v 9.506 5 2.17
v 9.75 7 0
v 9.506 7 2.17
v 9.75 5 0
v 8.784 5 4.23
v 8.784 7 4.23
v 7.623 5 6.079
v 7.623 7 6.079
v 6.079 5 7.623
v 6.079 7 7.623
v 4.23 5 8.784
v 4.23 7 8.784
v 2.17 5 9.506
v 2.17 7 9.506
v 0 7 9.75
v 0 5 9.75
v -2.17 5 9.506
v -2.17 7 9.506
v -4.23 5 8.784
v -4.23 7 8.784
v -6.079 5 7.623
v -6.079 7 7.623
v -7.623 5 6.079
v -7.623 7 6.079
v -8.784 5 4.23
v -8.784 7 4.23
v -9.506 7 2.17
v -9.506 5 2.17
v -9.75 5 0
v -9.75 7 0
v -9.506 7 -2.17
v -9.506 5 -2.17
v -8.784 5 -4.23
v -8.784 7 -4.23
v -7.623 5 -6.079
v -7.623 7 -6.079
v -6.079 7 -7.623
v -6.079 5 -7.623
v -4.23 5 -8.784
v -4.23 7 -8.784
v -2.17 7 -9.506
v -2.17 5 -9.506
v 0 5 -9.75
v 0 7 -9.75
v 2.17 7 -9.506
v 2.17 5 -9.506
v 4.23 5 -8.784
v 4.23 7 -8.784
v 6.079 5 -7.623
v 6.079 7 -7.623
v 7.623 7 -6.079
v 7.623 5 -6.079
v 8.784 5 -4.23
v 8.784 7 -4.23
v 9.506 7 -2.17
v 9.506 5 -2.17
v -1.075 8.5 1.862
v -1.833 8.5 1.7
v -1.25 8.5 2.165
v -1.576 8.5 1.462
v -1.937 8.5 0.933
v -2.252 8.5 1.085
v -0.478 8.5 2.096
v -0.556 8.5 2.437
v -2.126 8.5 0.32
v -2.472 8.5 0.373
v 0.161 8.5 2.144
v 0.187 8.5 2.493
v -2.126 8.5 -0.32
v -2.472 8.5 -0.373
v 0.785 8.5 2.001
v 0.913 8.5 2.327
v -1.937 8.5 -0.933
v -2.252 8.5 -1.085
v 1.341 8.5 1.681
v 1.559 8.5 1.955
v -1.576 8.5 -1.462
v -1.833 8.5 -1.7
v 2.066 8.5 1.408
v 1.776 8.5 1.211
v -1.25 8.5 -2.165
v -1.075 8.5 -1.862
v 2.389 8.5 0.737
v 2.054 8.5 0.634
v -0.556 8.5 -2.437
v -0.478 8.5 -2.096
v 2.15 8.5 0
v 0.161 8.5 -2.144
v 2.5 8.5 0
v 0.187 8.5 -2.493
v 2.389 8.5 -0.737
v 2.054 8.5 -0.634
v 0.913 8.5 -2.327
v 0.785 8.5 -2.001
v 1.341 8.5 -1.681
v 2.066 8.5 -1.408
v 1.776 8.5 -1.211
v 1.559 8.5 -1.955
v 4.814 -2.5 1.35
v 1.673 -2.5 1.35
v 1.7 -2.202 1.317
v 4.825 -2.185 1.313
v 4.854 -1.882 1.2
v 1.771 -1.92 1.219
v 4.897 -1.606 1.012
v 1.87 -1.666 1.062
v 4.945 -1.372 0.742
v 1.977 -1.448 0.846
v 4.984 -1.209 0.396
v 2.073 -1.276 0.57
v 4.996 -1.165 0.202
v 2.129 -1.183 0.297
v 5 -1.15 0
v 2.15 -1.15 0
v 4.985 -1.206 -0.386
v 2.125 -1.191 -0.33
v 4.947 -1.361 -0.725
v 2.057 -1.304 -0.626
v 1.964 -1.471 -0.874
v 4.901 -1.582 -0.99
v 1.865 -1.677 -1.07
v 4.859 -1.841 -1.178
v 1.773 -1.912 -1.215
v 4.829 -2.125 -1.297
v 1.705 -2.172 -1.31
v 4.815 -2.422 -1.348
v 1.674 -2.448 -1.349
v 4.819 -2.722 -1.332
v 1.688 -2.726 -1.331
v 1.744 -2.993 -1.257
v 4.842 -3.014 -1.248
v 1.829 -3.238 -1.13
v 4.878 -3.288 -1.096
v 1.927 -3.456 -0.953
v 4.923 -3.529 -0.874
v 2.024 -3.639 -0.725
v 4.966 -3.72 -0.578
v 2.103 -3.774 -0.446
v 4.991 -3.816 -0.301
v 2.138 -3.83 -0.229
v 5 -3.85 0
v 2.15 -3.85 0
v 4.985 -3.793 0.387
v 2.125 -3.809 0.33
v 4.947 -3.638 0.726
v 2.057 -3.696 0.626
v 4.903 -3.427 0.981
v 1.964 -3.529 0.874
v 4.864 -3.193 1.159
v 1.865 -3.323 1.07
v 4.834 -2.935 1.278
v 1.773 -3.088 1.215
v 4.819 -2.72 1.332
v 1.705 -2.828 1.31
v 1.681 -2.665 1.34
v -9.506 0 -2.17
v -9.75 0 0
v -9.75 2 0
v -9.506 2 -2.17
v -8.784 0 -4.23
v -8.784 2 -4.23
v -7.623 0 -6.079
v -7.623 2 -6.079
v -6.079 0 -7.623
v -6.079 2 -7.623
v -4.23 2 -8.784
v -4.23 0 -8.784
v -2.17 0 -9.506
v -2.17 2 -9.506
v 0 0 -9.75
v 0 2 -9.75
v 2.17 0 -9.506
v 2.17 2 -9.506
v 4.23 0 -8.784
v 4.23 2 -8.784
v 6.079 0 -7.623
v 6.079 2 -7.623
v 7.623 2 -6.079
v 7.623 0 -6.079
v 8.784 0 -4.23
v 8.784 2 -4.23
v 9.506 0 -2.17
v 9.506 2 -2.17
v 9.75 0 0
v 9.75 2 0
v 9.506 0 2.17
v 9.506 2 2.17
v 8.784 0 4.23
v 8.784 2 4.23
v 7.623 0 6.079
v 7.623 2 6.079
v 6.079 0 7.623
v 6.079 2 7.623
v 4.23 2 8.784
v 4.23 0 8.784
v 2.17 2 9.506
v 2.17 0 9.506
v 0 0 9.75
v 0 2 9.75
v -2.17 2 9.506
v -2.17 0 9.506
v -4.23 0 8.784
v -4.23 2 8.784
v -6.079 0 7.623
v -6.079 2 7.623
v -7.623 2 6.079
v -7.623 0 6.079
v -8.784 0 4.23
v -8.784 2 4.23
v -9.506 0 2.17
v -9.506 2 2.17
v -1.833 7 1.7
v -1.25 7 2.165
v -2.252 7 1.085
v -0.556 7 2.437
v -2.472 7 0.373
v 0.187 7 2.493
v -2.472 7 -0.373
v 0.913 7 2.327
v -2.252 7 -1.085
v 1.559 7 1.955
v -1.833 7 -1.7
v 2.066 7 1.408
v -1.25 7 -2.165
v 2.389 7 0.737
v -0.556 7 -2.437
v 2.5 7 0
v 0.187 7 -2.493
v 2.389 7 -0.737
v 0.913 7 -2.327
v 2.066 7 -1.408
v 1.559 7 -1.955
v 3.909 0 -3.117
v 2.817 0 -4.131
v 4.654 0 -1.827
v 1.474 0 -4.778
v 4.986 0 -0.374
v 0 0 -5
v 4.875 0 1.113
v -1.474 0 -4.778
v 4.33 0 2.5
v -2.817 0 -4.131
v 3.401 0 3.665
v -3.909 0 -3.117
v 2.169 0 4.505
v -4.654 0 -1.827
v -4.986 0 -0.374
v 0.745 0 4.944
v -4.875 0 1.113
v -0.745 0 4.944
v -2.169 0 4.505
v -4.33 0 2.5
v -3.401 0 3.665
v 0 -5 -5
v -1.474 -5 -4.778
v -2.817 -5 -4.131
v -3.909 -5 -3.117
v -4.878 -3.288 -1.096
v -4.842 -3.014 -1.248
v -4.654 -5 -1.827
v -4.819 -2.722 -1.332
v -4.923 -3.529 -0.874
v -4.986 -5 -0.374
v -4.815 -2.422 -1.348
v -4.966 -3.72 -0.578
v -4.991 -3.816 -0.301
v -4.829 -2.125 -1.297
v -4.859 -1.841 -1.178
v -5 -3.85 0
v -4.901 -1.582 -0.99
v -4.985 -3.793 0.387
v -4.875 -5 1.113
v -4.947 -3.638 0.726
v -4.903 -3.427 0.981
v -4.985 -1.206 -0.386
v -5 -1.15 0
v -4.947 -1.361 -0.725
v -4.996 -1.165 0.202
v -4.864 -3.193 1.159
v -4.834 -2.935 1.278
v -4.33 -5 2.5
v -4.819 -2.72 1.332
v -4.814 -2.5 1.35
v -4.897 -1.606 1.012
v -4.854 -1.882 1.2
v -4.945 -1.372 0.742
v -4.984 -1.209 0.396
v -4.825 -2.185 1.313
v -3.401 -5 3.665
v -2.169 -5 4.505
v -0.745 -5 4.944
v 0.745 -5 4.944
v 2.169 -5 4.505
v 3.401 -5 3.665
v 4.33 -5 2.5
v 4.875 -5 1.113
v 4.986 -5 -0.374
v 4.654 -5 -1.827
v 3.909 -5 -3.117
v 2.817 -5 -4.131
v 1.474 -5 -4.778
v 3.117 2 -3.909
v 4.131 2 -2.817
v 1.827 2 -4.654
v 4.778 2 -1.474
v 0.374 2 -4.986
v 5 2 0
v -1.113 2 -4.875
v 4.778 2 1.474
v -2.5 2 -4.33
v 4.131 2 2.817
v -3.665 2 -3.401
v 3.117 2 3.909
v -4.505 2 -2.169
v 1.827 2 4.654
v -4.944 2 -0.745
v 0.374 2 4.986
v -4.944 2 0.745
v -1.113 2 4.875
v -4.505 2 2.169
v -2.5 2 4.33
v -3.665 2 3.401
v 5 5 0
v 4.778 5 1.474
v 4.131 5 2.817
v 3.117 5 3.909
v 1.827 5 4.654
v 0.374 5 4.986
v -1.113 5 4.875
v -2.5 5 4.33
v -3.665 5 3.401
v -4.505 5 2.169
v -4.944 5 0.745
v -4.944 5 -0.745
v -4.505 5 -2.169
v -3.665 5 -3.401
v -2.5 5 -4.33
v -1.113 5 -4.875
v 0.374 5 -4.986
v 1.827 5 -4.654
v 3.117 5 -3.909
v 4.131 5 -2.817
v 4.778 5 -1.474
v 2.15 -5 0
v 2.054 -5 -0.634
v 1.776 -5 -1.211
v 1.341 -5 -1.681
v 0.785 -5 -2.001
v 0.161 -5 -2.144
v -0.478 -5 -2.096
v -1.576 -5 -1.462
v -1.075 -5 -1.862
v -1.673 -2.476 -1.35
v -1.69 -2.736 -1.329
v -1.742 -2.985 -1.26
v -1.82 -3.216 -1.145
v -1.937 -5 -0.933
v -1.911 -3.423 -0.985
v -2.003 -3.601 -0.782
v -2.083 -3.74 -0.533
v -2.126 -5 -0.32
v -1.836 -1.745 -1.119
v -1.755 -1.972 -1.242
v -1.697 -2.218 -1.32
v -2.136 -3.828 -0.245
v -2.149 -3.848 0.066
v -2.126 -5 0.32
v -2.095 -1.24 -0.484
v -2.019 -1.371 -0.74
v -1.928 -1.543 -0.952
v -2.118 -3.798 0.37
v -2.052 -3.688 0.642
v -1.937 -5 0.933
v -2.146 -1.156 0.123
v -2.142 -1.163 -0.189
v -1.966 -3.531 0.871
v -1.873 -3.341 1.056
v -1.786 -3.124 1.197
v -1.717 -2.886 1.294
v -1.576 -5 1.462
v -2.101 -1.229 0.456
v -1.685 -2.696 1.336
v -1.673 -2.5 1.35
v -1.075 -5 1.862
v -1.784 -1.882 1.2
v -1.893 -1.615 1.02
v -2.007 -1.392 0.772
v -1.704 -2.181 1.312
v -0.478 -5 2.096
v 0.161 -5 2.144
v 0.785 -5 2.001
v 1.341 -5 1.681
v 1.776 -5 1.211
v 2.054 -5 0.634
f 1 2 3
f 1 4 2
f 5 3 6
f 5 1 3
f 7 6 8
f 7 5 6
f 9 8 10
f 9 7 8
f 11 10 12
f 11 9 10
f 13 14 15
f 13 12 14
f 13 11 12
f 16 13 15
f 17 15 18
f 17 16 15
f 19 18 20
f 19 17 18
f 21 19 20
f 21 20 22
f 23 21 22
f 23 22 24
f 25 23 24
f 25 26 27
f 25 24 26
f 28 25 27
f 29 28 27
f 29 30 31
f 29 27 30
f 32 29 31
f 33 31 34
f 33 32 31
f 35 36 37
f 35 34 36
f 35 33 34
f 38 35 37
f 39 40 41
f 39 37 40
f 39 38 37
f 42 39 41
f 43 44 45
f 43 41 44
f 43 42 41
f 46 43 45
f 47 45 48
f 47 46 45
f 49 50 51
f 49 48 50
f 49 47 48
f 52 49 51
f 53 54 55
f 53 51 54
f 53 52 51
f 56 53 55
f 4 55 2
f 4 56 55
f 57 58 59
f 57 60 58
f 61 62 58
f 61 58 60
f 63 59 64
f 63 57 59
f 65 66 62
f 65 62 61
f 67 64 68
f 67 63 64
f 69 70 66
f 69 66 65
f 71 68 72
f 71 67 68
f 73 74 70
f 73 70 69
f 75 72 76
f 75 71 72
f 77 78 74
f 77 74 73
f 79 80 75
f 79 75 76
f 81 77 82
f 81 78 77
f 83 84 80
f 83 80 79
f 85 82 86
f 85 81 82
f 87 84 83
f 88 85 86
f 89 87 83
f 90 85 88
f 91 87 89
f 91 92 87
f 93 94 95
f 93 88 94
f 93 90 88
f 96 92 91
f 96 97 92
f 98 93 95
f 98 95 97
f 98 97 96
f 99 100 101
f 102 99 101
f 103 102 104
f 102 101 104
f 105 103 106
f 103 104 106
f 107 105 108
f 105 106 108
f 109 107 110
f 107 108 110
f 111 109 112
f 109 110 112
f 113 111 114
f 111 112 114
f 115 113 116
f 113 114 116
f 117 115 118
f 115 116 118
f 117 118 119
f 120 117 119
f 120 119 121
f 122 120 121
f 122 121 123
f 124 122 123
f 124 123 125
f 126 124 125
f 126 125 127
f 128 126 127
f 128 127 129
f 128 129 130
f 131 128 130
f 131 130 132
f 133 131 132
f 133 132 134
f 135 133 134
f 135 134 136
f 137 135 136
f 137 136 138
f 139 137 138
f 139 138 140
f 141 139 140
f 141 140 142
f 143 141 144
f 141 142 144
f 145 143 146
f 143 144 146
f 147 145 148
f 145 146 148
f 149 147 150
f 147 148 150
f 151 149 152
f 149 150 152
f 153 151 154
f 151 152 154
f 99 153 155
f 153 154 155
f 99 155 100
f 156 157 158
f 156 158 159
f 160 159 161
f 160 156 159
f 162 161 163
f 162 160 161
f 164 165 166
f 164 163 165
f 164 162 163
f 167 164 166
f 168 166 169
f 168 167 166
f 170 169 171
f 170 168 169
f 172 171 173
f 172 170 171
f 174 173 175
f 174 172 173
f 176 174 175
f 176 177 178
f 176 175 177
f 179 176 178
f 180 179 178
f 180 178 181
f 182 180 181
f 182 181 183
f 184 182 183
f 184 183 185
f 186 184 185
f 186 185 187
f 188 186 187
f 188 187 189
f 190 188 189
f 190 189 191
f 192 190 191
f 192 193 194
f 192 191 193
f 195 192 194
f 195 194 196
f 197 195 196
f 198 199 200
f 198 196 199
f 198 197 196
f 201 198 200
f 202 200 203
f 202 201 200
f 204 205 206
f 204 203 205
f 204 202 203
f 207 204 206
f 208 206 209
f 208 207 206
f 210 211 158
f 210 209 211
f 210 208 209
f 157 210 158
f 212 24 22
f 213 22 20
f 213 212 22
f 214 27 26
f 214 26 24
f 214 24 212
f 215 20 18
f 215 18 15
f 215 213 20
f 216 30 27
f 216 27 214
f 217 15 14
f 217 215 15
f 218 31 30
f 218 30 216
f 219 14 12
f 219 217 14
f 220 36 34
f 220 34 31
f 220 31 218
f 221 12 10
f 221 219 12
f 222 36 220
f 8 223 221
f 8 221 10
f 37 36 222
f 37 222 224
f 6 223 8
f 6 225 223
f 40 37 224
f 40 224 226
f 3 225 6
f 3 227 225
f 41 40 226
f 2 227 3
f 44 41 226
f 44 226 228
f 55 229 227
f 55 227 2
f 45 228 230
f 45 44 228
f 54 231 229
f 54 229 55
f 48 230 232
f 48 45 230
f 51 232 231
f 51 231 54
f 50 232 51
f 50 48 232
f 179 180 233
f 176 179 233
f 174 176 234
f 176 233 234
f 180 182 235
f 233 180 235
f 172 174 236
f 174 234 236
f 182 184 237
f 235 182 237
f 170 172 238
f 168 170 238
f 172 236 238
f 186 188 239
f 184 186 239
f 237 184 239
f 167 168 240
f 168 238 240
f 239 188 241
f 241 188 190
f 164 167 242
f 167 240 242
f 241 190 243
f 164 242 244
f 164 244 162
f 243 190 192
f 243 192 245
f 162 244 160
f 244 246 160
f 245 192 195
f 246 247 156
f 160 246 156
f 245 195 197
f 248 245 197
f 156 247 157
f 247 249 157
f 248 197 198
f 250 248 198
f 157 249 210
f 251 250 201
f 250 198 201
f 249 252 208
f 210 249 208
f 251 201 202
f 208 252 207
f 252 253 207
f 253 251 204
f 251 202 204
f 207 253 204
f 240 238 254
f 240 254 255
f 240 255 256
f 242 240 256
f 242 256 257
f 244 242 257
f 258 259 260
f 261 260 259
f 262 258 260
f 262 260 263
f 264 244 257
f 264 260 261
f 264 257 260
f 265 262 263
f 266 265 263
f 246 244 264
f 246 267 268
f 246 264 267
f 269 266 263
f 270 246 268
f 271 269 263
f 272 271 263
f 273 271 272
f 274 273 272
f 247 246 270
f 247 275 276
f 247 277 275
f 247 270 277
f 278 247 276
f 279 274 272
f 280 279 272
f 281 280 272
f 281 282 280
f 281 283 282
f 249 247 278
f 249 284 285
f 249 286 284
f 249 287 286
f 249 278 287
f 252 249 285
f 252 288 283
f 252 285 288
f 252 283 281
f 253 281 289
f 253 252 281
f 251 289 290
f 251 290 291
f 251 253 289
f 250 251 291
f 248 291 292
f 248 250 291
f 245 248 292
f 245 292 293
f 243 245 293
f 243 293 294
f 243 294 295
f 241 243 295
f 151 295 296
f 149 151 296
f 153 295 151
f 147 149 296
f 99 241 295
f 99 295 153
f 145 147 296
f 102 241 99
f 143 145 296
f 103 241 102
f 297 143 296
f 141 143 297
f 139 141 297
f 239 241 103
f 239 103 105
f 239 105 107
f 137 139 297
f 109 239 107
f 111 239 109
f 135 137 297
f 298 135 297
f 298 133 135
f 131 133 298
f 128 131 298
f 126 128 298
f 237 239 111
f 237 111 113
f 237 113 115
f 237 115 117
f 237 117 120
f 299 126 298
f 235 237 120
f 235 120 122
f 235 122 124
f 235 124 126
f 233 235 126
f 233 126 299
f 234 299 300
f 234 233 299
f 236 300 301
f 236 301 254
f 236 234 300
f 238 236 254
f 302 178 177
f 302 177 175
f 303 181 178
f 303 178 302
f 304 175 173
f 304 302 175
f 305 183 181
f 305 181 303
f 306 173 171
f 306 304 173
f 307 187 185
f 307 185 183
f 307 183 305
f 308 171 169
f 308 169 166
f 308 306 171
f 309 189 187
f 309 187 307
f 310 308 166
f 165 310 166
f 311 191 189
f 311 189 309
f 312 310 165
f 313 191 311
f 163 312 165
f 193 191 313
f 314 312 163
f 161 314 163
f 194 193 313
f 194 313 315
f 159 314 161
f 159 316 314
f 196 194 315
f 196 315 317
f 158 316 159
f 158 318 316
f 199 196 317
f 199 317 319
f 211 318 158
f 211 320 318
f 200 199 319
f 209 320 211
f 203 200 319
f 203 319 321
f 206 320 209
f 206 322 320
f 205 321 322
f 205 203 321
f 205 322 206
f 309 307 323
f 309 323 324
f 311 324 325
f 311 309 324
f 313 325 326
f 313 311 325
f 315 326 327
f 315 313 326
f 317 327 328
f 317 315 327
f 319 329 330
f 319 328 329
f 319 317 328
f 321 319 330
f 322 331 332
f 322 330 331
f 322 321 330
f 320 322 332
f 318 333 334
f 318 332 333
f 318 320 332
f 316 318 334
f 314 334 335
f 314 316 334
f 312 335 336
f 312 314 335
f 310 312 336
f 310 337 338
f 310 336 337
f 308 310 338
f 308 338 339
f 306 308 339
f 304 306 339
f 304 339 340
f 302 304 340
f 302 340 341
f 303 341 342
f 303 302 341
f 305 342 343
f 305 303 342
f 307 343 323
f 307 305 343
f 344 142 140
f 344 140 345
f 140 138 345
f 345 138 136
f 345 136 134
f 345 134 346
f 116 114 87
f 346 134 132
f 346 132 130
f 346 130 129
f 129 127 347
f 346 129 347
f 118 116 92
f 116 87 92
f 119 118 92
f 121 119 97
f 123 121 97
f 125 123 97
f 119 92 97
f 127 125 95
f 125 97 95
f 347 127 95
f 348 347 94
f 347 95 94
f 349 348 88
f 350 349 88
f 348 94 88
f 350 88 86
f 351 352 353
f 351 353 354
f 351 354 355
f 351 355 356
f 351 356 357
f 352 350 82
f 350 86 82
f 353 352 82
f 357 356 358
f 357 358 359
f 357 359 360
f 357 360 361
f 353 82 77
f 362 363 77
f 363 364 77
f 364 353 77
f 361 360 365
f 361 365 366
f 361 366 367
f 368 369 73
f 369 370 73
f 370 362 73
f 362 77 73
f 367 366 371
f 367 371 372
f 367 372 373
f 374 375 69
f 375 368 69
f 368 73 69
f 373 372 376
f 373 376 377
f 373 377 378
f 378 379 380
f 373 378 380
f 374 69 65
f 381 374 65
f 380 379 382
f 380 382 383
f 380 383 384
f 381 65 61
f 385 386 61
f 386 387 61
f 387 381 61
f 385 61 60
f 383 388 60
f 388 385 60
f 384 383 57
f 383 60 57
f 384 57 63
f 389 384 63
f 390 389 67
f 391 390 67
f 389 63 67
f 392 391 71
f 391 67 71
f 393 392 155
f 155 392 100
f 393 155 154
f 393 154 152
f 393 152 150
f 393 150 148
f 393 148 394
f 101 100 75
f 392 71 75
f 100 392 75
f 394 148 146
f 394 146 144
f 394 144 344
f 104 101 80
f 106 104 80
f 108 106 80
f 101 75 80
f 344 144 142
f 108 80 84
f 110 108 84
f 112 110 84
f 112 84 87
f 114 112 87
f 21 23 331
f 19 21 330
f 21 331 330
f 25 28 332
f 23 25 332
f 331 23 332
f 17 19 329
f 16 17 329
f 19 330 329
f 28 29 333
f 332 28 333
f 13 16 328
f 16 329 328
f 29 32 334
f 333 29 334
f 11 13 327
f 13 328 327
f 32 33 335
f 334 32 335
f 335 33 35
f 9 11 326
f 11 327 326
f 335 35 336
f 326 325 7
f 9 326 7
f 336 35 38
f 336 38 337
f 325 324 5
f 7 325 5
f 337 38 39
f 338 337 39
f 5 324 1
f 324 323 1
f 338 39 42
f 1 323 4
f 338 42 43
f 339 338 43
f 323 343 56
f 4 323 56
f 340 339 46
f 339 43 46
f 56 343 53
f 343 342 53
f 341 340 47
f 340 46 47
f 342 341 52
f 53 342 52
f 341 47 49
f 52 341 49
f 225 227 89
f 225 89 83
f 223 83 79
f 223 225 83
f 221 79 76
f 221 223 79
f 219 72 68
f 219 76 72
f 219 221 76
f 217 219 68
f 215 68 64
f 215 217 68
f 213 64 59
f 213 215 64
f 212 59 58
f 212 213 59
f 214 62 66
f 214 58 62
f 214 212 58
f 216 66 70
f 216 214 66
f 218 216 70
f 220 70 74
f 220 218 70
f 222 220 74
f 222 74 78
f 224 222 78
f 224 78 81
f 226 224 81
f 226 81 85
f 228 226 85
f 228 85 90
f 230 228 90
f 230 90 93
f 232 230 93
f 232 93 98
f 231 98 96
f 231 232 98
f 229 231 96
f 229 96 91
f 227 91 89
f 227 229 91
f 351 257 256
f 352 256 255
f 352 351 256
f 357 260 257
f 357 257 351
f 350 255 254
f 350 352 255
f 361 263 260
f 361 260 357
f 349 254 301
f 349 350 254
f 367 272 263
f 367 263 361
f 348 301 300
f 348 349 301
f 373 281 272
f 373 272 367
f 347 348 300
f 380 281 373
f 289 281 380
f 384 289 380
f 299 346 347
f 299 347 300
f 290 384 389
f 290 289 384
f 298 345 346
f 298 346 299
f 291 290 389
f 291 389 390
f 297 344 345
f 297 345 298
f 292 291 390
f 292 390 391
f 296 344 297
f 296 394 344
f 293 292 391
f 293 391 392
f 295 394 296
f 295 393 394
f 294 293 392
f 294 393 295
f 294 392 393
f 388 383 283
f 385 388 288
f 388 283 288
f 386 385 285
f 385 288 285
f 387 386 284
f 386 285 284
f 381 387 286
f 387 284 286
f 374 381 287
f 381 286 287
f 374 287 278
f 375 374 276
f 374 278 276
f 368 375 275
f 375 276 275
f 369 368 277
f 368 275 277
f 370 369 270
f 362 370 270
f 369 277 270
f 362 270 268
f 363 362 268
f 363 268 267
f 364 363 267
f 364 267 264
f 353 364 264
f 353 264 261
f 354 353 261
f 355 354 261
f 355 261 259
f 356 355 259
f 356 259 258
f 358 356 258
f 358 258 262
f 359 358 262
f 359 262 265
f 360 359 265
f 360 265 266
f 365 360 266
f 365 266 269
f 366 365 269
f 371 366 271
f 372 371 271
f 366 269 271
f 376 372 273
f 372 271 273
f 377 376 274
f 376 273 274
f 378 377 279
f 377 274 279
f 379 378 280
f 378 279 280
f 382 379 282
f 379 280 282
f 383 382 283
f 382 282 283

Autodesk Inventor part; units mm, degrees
ref_plane "YZ Plane" through (0, 0, 0) normal (1, 0, 0) x (0, 1, 0)
ref_plane "XZ Plane" through (0, 0, 0) normal (0, 1, 0) x (-1, 0, 0)
ref_plane "XY Plane" through (0, 0, 0) normal (0, 0, 1) x (1, 0, 0)
sketch "Эскиз1" plane through (0, 0, 0) normal (0, 1, 0) x (-1, 0, 0)
  circle A0 centre (0, 0) radius 9.75
  dimension "d0" = 19.5
extrude "Выдавливание1" add sketch "Эскиз1" along normal blind 2
sketch "Эскиз5" plane through (0, 0, 0) normal (0, -1, 0) x (1, 0, 0)
  line L0 (5, -5) -> (-5, -5)
  line L1 (-5, -5) -> (-5, 5)
  line L2 (-5, 5) -> (5, 5)
  line L3 (5, 5) -> (5, -5)
  point P0 (0, 0)
  dimension "d12" = 10
  dimension "d13" = 10
  dimension "d17" = 5
  dimension "d27" = 5
extrude "Выдавливание5" add sketch "Эскиз5" along normal blind 5
sketch "Эскиз6" plane through (-5, 0, -5) normal (-1, 0, 0) x (0, 0, 1)
  circle A0 centre (5, -2.5) radius 1.35
  line L0 (10, -5) -> (0, -5) projected
  line L1 (0, 0) -> (0, -5) projected
  point P0 (5, 0)
  point P1 (0, -2.5)
  dimension "d30" = 2.7
  dimension "d31" = 2.5
  dimension "d32" = 5
extrude "Выдавливание6" cut sketch "Эскиз6" against normal blind 15.75
fillet "Сопряжение1" radius 5 4 edges at (5, -2.5, 5) (-5, -2.5, 5) (-5, -2.5, -5) (5, -2.5, -5)
sketch "Эскиз11" plane through (0, 2, 0) normal (0, 1, 0) x (1, 0, 0)
  circle A0 centre (0, 0) radius 5
  dimension "d47" = 10
extrude "Выдавливание9" add sketch "Эскиз11" along normal blind 3
sketch "Эскиз12" plane through (0, 5, 0) normal (0, 1, 0) x (1, 0, 0)
  circle A0 centre (0, 0) radius 9.75
  dimension "d50" = 19.5
extrude "Выдавливание10" add sketch "Эскиз12" along normal blind 2
sketch "Эскиз14" plane through (0, 7, 0) normal (0, 1, 0) x (1, 0, 0)
  circle A0 centre (0, 0) radius 2.5
  dimension "d56" = 5
extrude "Выдавливание12" add sketch "Эскиз14" along normal blind 1.5
sketch "Эскиз15" plane through (0, 8.5, 0) normal (0, 1, 0) x (1, 0, 0)
  circle A0 centre (0, 0) radius 2.15
  dimension "d59" = 4.3
extrude "Выдавливание13" cut sketch "Эскиз15" against normal blind 33.5
properties part number "koleso_left"
